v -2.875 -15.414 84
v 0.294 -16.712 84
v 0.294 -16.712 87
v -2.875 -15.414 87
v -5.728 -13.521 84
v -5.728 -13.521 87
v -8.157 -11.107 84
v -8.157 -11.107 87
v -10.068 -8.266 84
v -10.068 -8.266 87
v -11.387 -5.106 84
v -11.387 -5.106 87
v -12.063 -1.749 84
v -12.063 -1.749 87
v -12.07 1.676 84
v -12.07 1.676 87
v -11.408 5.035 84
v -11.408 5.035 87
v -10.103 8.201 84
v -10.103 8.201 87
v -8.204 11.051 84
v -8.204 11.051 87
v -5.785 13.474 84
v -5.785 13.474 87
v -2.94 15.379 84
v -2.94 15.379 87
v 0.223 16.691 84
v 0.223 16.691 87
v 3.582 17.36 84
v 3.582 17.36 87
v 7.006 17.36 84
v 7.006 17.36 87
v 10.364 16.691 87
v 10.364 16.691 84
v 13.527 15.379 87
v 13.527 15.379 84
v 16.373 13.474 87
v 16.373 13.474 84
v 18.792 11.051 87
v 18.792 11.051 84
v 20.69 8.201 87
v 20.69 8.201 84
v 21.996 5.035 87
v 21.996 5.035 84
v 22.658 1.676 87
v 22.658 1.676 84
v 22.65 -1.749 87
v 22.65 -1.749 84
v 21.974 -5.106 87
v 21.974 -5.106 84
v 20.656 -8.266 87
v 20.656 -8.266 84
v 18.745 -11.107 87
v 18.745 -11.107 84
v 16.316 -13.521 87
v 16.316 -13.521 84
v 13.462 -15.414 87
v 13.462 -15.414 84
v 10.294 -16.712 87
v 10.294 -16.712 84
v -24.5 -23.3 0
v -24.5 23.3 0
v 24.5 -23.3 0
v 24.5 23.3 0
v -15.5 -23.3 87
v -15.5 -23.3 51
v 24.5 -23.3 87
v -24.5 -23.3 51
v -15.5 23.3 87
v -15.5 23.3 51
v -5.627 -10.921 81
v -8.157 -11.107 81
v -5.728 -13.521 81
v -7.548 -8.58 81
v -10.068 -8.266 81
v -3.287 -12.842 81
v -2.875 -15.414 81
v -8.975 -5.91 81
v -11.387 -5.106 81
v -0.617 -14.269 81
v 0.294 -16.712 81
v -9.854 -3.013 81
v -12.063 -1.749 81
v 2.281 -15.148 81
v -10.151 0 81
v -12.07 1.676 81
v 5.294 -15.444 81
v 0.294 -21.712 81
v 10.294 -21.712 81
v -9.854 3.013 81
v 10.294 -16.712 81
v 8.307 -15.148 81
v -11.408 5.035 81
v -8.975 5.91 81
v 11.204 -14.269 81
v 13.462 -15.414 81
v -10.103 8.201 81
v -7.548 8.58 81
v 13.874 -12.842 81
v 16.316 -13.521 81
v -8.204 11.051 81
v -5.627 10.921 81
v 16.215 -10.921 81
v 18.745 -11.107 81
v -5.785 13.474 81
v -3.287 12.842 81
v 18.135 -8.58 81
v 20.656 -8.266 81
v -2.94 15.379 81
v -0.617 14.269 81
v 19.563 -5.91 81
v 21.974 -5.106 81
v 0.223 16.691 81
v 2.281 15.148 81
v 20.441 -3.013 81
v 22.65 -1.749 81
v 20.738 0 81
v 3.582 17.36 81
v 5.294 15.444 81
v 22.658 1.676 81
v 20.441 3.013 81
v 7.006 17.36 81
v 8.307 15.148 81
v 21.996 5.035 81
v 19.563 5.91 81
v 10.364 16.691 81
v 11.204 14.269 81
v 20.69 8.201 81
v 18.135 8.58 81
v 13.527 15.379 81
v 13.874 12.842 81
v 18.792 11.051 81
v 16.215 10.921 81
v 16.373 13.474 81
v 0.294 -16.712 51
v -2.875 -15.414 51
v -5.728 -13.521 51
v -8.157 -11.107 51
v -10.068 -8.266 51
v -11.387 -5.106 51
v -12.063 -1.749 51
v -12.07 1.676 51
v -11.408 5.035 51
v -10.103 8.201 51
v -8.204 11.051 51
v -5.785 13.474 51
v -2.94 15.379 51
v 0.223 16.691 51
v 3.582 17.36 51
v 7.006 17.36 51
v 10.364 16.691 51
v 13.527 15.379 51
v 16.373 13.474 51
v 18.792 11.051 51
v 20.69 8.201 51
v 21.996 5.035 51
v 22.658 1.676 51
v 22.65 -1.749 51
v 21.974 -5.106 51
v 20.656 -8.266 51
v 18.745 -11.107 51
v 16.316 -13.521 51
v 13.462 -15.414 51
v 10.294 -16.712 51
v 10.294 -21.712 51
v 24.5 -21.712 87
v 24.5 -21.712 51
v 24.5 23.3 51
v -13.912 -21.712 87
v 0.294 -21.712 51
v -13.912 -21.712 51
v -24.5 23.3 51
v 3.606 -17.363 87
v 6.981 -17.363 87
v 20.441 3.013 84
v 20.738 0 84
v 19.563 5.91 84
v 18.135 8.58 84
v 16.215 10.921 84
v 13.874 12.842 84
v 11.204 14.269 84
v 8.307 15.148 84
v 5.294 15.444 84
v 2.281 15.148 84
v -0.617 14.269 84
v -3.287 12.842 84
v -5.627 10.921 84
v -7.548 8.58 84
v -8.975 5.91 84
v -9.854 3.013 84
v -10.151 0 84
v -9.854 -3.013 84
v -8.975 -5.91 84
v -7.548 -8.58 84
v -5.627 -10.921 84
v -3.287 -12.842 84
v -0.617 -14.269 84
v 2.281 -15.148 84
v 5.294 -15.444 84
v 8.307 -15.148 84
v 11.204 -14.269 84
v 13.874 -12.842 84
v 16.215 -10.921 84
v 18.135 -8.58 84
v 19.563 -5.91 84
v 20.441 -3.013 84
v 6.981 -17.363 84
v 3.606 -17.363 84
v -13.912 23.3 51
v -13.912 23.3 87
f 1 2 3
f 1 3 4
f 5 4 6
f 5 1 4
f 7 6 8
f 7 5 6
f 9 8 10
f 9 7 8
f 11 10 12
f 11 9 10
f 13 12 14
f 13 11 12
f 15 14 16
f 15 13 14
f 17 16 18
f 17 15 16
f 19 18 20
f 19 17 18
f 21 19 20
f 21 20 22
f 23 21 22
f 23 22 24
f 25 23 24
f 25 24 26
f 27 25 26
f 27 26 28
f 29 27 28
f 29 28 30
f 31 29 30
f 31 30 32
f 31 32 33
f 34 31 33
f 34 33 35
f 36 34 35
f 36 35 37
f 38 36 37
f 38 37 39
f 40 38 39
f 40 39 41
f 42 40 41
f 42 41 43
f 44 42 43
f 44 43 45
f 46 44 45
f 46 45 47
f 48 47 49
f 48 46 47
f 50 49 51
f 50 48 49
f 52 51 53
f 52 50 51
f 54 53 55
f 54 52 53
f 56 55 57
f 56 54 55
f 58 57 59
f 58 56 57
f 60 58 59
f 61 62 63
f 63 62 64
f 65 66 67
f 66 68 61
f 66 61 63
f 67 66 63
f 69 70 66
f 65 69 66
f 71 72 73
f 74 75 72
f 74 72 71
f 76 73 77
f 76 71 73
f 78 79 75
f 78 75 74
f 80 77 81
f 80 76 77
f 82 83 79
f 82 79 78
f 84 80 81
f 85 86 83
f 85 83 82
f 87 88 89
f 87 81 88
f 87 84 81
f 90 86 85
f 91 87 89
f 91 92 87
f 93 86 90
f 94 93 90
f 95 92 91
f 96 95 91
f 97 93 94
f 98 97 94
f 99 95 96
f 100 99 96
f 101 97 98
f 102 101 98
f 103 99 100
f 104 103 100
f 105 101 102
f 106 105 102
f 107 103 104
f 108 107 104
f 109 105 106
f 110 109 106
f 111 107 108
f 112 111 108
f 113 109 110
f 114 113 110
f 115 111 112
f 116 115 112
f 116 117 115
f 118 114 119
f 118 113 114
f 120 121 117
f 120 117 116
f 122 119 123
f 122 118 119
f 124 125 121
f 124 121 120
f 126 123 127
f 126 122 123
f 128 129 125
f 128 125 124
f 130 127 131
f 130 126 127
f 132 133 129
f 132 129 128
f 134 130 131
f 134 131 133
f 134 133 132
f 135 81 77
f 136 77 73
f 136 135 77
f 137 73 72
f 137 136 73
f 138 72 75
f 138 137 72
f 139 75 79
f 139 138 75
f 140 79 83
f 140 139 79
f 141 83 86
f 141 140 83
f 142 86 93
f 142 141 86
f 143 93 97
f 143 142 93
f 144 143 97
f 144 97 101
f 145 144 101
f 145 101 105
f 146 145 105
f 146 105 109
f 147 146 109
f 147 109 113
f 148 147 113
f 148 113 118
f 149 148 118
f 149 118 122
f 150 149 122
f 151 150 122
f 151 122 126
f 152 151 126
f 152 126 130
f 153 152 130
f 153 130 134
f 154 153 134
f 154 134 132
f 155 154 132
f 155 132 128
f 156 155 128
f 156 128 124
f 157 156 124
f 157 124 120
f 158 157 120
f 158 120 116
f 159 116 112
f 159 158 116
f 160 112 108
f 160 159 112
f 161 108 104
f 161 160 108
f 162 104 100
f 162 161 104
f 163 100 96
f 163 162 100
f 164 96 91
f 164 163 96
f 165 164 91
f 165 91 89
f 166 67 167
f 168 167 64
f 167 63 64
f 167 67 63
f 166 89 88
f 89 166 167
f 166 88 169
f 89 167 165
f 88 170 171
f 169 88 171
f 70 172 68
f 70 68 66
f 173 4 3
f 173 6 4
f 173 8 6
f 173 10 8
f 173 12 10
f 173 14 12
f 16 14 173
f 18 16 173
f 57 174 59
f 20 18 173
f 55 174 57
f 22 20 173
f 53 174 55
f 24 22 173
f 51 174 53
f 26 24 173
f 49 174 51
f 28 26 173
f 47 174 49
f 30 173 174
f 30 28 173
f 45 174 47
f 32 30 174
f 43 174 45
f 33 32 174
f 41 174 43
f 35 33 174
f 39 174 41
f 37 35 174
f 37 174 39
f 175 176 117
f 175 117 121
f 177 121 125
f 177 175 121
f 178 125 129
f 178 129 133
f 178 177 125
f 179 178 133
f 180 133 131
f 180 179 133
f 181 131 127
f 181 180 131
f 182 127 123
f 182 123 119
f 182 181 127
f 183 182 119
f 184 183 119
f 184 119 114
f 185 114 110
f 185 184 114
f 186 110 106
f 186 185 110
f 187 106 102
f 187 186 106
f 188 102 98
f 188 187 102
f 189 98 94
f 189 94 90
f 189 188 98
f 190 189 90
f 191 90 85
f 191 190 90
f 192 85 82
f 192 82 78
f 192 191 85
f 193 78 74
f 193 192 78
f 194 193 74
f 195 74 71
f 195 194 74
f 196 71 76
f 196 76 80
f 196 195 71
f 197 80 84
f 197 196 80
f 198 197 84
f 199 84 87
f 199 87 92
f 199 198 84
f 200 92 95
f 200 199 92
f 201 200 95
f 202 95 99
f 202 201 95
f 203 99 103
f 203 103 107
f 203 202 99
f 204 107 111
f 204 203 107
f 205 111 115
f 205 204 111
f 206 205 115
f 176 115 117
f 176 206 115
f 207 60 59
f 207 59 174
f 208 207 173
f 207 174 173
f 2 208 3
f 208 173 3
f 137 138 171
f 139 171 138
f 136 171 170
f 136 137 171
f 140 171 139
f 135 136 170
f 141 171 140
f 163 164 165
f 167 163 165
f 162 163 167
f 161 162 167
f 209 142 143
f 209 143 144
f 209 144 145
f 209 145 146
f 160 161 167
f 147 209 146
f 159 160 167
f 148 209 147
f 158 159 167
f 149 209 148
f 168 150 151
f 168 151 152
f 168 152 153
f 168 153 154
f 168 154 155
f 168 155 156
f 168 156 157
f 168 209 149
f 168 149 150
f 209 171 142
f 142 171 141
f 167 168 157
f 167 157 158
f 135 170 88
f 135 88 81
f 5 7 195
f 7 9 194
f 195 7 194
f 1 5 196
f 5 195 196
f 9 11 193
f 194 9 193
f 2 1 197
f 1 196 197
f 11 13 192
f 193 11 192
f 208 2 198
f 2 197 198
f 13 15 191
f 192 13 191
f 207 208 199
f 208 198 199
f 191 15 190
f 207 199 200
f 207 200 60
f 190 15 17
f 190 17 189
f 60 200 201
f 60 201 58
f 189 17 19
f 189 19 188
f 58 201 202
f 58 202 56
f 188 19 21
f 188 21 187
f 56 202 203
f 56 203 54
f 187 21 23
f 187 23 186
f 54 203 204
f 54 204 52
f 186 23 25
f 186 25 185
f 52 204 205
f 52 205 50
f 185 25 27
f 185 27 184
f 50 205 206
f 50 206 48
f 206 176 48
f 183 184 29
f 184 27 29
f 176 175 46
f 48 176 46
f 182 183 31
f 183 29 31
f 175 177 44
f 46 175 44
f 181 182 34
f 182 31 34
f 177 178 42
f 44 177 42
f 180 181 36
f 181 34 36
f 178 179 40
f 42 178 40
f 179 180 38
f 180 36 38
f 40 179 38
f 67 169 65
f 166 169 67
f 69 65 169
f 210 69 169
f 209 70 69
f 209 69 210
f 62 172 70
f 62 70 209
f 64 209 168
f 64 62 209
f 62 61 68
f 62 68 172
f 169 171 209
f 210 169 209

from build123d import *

# Parameters (mm, degrees)
SKETCH1_W           = 49
SKETCH1_H           = 46.6
BOSS_EXTRUDE1_DEPTH = 51
BOSS_EXTRUDE2_DEPTH = 36
BOSS_EXTRUDE3_DEPTH = 36
CUT_EXTRUDE1_START  = -3
SKETCH4_R           = 17.444416191
SKETCH4_R_2         = 15.444416191
CUT_EXTRUDE1_DEPTH  = 3
CUT_EXTRUDE2_DEPTH  = 6


with BuildPart() as part:
    # Sketch1 → Boss-Extrude1 (new body)
    with BuildSketch(Plane.XY):
        Rectangle(SKETCH1_W, SKETCH1_H)
    extrude(amount=BOSS_EXTRUDE1_DEPTH)

    # Sketch2 → Boss-Extrude2 (add)
    with BuildSketch(Plane.XY.offset(51)):
        Polygon((24.5, -23.3), (24.5, -21.7125), (-13.9125, -21.7125), (-13.9125, 23.3), (-15.5, 23.3), (-15.5, -23.3), align=None)
    extrude(amount=BOSS_EXTRUDE2_DEPTH)

    # Sketch3 → Boss-Extrude3 (add)
    with BuildSketch(Plane.XY.offset(51)):
        with BuildLine():
            Line((0.29375, -21.7125), (0.29375, -16.7125))
            ThreePointArc((0.29375, -16.7125), (5.29375, 17.444416191), (10.29375, -16.7125))
            Line((10.29375, -16.7125), (10.29375, -21.7125))
            Line((10.29375, -21.7125), (0.29375, -21.7125))
        make_face()
    extrude(amount=BOSS_EXTRUDE3_DEPTH)

    # Sketch4 → Cut-Extrude1 (cut)
    with BuildSketch(Plane.XY.offset(87).offset(CUT_EXTRUDE1_START)):
        with Locations((5.29375, 0)):
            Circle(SKETCH4_R)
        with Locations((5.29375, 0)):
            Circle(SKETCH4_R_2, mode=Mode.SUBTRACT)
    extrude(amount=-CUT_EXTRUDE1_DEPTH, mode=Mode.SUBTRACT)

    # Sketch5 → Cut-Extrude2 (cut)
    with BuildSketch(Plane.XY.offset(87)):
        with BuildLine():
            Line((0.29375, -21.7125), (10.29375, -21.7125))
            Line((10.29375, -21.7125), (10.29375, -16.7125))
            ThreePointArc((10.29375, -16.7125), (5.29375, -17.444416191), (0.29375, -16.7125))
            Line((0.29375, -16.7125), (0.29375, -21.7125))
        make_face()
    extrude(amount=-CUT_EXTRUDE2_DEPTH, mode=Mode.SUBTRACT)


solid = part.part
